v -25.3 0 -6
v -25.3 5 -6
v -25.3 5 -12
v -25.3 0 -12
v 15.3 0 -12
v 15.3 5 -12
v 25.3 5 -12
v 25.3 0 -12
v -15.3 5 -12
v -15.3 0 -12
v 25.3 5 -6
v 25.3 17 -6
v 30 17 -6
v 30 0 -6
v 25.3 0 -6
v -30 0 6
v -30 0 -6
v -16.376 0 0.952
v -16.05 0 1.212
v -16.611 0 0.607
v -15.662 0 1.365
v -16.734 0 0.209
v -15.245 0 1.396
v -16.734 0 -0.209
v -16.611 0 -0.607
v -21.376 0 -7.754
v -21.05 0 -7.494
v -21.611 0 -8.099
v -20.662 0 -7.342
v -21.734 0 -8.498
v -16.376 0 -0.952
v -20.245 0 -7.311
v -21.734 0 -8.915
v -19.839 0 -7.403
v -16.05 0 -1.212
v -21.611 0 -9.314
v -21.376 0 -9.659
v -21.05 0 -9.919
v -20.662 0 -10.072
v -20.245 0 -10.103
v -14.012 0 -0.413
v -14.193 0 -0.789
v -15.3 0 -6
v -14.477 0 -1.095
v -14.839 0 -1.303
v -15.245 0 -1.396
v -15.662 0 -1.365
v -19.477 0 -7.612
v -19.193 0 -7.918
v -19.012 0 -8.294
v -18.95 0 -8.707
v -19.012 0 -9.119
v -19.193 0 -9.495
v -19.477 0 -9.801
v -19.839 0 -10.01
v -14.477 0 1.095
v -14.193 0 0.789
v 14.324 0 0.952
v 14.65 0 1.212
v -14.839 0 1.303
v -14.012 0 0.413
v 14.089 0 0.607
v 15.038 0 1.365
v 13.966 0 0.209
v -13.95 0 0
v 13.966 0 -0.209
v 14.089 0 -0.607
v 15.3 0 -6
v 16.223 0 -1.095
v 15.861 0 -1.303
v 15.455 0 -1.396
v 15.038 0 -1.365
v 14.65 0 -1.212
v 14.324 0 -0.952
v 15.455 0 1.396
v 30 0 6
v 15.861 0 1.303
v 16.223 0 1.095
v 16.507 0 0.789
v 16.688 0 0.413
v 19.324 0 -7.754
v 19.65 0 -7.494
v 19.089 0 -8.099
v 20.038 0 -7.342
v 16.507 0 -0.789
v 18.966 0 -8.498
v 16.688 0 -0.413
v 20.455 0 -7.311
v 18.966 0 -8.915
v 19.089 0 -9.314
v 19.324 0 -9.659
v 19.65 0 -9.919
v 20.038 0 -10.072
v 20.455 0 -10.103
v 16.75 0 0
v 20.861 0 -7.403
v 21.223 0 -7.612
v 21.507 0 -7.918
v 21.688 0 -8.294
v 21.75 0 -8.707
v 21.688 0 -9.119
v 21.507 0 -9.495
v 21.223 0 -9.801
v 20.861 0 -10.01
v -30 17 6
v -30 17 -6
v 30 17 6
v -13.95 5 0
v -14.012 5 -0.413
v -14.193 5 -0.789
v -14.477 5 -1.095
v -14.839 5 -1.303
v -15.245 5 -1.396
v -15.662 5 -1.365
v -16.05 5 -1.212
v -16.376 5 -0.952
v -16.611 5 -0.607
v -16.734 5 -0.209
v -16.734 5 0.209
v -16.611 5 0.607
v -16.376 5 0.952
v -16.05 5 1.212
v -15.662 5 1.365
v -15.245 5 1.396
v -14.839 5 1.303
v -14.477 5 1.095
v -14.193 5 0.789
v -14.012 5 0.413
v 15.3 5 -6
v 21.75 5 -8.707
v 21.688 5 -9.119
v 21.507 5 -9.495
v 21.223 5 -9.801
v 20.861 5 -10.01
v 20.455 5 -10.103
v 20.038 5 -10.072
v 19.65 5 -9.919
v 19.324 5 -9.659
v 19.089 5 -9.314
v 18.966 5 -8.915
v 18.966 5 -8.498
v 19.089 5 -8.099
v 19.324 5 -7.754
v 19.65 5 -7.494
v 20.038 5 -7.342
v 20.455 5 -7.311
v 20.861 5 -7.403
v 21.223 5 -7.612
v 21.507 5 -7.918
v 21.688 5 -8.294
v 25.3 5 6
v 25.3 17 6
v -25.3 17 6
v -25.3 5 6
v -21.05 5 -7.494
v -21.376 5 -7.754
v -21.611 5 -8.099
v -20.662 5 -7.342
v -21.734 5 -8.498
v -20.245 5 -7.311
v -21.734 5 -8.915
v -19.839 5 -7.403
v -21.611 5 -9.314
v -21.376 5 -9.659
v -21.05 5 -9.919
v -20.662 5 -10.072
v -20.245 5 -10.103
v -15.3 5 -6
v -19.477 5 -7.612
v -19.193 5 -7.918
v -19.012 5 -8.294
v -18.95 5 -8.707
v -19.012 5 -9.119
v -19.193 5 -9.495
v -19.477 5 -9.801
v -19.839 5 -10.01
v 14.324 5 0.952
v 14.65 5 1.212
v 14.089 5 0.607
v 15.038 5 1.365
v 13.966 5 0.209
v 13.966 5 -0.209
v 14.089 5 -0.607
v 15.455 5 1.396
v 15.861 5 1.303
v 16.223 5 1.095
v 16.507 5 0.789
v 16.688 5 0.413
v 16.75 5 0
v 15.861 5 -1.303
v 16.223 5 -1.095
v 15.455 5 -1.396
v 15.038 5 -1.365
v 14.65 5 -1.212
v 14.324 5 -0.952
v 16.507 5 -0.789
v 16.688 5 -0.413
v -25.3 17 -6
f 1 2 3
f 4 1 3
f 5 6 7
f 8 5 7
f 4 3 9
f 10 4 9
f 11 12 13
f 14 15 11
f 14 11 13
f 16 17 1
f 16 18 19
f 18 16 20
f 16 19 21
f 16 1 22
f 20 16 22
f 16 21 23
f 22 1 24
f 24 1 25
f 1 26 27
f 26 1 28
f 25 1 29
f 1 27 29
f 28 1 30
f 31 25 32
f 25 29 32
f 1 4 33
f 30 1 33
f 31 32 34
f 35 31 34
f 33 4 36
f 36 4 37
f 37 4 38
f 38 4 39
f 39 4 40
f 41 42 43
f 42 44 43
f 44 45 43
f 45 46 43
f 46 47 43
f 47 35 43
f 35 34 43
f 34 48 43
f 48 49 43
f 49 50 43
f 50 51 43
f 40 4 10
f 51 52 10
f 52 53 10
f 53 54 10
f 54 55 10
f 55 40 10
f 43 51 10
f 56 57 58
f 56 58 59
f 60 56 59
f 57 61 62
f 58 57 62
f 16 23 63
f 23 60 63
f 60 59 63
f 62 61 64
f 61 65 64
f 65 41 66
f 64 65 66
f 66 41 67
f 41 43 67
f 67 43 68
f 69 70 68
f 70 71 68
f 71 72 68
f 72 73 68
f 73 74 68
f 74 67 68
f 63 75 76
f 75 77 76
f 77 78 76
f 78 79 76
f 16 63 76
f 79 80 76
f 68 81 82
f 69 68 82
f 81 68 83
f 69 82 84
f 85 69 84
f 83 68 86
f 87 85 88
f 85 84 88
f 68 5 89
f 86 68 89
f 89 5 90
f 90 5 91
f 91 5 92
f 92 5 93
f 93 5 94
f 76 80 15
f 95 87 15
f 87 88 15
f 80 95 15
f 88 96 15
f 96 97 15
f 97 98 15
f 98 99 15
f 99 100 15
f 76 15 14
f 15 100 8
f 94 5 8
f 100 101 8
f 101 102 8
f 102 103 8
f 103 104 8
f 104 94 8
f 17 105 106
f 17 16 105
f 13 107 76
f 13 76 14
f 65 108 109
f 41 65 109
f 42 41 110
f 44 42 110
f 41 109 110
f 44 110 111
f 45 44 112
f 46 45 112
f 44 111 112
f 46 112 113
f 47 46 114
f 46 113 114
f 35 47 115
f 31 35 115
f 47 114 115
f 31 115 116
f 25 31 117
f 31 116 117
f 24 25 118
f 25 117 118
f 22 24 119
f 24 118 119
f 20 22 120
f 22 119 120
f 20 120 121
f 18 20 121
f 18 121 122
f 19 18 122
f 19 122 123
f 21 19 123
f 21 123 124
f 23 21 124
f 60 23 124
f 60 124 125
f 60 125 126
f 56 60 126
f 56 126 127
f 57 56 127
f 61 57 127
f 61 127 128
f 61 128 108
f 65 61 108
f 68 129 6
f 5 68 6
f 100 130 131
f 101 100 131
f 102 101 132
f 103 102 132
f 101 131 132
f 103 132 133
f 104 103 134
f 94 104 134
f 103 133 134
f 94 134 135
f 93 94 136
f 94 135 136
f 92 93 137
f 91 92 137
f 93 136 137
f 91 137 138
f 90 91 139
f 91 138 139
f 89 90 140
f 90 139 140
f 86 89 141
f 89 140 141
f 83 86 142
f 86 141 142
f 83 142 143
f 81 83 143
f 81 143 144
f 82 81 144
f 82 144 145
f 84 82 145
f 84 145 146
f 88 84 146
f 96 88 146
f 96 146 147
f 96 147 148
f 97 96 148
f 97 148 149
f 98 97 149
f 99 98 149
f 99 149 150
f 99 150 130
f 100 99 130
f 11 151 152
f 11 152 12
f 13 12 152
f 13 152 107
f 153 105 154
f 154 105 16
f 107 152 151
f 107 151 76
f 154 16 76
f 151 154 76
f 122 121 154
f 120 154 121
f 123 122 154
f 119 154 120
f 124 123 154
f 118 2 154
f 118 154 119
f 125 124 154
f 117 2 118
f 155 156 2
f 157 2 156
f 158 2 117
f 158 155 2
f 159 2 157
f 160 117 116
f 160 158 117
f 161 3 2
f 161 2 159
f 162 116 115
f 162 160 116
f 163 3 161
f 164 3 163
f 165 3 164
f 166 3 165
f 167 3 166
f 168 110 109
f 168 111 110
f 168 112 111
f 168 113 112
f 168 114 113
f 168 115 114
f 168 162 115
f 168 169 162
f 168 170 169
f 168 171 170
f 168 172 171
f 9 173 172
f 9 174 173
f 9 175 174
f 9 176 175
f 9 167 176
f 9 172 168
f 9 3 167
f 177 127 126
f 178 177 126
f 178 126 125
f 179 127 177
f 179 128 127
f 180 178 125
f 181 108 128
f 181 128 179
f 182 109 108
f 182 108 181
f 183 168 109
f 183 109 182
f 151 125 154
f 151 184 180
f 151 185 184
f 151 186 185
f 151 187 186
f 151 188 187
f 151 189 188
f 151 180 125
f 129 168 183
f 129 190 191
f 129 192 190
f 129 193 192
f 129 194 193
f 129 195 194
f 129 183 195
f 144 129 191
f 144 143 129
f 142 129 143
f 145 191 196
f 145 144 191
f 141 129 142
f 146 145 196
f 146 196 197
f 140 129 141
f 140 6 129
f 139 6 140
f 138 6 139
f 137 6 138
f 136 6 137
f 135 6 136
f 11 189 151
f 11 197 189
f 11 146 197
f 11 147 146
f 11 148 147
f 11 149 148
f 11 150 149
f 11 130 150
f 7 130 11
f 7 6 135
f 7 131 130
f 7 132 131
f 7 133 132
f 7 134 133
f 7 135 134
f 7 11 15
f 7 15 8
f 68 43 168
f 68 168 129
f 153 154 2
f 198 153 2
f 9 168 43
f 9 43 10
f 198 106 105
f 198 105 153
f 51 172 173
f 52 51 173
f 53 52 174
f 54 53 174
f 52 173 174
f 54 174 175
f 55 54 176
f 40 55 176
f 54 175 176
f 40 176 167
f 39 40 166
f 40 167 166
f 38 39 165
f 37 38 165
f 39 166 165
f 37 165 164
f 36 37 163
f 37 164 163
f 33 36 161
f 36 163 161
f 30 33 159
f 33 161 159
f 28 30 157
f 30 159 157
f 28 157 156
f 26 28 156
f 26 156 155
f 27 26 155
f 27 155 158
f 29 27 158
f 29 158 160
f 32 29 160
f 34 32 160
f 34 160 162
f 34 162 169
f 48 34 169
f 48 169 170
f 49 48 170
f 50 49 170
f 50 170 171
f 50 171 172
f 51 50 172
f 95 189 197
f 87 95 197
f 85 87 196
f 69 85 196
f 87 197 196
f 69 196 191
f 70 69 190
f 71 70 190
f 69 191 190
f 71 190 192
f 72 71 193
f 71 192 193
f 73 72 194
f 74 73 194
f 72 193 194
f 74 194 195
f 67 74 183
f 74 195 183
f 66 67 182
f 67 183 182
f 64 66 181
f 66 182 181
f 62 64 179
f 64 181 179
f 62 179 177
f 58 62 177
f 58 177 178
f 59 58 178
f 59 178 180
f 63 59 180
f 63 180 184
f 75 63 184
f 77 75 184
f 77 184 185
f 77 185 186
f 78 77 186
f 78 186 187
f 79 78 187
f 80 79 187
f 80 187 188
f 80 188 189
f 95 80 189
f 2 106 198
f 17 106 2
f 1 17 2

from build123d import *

# Parameters (mm, degrees)
SKETCH_1_W      = 60
SKETCH_1_H      = 12
EXTRUDE_1_DEPTH = 5
SKETCH_2_W      = 4.7
SKETCH_2_H      = 12
EXTRUDE_2_DEPTH = 12
M3X0_5_3_D      = 2.8
SKETCH_12_W     = 10
SKETCH_12_H     = 6
EXTRUDE_3_DEPTH = 5
M3X0_5_4_D      = 2.8


with BuildPart() as part:
    # 草图1 → 凸台-拉伸1 (new body)
    with BuildSketch(Plane(origin=(0, 0, 0), x_dir=(1, 0, 0), z_dir=(0, 1, 0))):
        Rectangle(SKETCH_1_W, SKETCH_1_H)
    extrude(amount=EXTRUDE_1_DEPTH)

    # 草图2 → 凸台-拉伸2 (add)
    with BuildSketch(Plane(origin=(0, 5, 0), x_dir=(1, 0, 0), z_dir=(0, 1, 0))):
        with Locations((-27.65, 0)):
            Rectangle(SKETCH_2_W, SKETCH_2_H)
        with Locations((27.65, 0)):
            Rectangle(SKETCH_2_W, SKETCH_2_H)
    extrude(amount=EXTRUDE_2_DEPTH)

    # M3x0.5 螺纹孔3 (through all)
    with Locations(Plane(origin=(0, 0, 0), x_dir=(-1, 0, 0), z_dir=(0, -1, 0))):
        with Locations((-15.35, 0), (15.35, 0)):
            Hole(M3X0_5_3_D / 2)

    # 草图12 → 凸台-拉伸3 (add)
    with BuildSketch(Plane(origin=(0, 5, 0), x_dir=(1, 0, 0), z_dir=(0, 1, 0))):
        with Locations((-20.3, 9)):
            Rectangle(SKETCH_12_W, SKETCH_12_H)
        with Locations((20.3, 9)):
            Rectangle(SKETCH_12_W, SKETCH_12_H)
    extrude(amount=-EXTRUDE_3_DEPTH)

    # M3x0.5 螺纹孔4 (through all)
    with Locations(Plane(origin=(0, 0, 0), x_dir=(-1, 0, 0), z_dir=(0, -1, 0))):
        with Locations((20.35, 8.706622657), (-20.35, 8.706622657)):
            Hole(M3X0_5_4_D / 2)


solid = part.part
